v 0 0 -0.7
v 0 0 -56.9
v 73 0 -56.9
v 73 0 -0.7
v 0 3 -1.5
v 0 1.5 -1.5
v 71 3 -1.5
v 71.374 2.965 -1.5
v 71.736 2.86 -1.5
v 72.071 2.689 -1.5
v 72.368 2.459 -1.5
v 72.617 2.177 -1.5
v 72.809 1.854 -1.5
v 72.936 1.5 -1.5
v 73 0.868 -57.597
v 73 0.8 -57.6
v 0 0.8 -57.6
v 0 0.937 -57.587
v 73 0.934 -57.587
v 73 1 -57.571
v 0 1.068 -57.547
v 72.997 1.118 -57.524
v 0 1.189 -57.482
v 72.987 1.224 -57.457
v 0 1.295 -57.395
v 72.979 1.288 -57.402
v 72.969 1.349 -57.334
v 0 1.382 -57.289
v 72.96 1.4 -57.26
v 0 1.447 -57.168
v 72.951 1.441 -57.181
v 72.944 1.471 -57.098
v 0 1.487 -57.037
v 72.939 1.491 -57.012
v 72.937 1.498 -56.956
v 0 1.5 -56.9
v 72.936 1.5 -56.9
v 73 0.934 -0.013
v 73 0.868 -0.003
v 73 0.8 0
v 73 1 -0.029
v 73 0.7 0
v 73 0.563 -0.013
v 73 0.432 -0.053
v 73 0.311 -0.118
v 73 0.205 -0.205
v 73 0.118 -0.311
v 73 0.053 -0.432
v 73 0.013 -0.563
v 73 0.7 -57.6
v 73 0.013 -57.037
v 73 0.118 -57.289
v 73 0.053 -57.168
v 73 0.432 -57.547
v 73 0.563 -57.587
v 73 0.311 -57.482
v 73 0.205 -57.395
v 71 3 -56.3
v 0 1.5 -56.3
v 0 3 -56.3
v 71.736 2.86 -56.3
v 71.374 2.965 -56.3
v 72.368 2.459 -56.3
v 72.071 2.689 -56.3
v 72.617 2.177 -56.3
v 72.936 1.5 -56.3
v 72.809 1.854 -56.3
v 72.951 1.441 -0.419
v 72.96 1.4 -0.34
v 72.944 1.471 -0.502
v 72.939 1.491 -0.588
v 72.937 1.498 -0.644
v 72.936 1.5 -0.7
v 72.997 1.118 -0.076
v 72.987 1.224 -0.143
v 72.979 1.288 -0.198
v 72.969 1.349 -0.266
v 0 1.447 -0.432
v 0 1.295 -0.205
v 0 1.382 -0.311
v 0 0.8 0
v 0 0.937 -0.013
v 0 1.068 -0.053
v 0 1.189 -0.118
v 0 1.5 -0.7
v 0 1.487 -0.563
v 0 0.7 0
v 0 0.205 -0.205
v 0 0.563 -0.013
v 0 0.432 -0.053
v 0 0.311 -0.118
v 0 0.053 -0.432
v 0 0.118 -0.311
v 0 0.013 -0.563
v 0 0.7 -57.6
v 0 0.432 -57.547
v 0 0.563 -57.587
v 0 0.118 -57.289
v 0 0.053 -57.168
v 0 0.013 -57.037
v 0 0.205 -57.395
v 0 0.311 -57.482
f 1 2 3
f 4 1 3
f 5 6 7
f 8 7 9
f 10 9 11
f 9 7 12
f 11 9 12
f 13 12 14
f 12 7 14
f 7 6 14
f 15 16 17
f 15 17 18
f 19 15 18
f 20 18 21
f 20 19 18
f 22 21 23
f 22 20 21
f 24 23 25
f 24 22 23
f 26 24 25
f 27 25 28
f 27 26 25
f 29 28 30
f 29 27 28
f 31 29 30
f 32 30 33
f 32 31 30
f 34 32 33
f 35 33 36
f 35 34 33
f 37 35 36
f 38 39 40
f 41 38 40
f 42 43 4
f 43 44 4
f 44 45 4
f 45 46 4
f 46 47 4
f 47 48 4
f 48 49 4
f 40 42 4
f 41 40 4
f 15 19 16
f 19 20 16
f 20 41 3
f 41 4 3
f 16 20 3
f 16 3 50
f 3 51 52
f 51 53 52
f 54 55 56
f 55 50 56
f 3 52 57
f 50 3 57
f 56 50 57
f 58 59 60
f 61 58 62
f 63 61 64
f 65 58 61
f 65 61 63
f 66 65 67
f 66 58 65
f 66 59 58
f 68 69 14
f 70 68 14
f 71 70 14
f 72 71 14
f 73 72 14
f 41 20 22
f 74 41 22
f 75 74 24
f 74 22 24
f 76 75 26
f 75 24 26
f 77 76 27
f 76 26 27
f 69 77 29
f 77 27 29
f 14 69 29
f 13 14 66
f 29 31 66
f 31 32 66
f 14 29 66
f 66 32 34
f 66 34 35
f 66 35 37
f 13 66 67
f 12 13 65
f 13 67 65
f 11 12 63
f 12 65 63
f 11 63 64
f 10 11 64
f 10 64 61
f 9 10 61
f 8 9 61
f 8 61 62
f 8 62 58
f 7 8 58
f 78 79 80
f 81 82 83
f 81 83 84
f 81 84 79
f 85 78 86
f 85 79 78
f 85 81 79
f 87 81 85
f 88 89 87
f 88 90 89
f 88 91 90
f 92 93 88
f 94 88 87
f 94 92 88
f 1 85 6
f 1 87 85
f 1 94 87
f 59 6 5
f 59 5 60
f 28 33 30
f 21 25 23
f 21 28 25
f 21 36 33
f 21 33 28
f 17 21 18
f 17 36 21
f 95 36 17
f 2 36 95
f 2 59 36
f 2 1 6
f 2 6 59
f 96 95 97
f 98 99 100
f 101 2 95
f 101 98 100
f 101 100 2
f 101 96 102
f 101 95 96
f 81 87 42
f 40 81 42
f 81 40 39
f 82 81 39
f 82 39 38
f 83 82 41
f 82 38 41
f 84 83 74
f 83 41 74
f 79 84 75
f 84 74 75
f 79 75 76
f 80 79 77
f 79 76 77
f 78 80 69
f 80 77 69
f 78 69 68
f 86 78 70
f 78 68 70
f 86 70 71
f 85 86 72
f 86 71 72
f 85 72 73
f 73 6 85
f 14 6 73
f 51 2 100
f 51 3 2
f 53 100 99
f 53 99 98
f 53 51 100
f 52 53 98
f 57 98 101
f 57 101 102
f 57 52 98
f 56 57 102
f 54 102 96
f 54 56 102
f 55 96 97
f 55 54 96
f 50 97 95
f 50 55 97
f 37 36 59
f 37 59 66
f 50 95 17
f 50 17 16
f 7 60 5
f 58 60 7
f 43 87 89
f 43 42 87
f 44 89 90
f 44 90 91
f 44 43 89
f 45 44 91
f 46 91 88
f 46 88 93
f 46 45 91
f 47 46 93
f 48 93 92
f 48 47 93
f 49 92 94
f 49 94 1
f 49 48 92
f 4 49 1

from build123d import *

# Parameters (mm, degrees)
CROQUIS1_W              = 73
CROQUIS1_H              = 57.6
SALIENTE_EXTRUIR1_DEPTH = 1.5
CROQUIS3_W              = 73
CROQUIS3_H              = 54.8
SALIENTE_EXTRUIR2_DEPTH = 3
REDONDEO1_R             = 2
REDONDEO4_R             = 0.7
REDONDEO5_R             = 0.7


with BuildPart() as part:
    # Croquis1 → Saliente-Extruir1 (new body)
    with BuildSketch(Plane(origin=(0, 0, 0), x_dir=(1, 0, 0), z_dir=(0, 1, 0))):
        with Locations((36.5, 28.8)):
            Rectangle(CROQUIS1_W, CROQUIS1_H)
    extrude(amount=SALIENTE_EXTRUIR1_DEPTH)

    # Croquis3 → Saliente-Extruir2 (add)
    with BuildSketch(Plane(origin=(0, 0, 0), x_dir=(1, 0, 0), z_dir=(0, 1, 0))):
        with Locations((36.5, 28.9)):
            Rectangle(CROQUIS3_W, CROQUIS3_H)
    extrude(amount=SALIENTE_EXTRUIR2_DEPTH)

    # Redondeo1
    redondeo1_edges = [part.edges().sort_by_distance(p)[0] for p in [
        (73, 3, -28.9),
    ]]
    fillet(redondeo1_edges, radius=REDONDEO1_R)

    # Redondeo4
    redondeo4_edges = [part.edges().sort_by_distance(p)[0] for p in [
        (36.5, 0, 0),
        (36.468245837, 1.5, 0),
    ]]
    fillet(redondeo4_edges, radius=REDONDEO4_R)

    # Redondeo5
    redondeo5_edges = [part.edges().sort_by_distance(p)[0] for p in [
        (36.5, 0, -57.6),
        (36.468245837, 1.5, -57.6),
    ]]
    fillet(redondeo5_edges, radius=REDONDEO5_R)


solid = part.part
